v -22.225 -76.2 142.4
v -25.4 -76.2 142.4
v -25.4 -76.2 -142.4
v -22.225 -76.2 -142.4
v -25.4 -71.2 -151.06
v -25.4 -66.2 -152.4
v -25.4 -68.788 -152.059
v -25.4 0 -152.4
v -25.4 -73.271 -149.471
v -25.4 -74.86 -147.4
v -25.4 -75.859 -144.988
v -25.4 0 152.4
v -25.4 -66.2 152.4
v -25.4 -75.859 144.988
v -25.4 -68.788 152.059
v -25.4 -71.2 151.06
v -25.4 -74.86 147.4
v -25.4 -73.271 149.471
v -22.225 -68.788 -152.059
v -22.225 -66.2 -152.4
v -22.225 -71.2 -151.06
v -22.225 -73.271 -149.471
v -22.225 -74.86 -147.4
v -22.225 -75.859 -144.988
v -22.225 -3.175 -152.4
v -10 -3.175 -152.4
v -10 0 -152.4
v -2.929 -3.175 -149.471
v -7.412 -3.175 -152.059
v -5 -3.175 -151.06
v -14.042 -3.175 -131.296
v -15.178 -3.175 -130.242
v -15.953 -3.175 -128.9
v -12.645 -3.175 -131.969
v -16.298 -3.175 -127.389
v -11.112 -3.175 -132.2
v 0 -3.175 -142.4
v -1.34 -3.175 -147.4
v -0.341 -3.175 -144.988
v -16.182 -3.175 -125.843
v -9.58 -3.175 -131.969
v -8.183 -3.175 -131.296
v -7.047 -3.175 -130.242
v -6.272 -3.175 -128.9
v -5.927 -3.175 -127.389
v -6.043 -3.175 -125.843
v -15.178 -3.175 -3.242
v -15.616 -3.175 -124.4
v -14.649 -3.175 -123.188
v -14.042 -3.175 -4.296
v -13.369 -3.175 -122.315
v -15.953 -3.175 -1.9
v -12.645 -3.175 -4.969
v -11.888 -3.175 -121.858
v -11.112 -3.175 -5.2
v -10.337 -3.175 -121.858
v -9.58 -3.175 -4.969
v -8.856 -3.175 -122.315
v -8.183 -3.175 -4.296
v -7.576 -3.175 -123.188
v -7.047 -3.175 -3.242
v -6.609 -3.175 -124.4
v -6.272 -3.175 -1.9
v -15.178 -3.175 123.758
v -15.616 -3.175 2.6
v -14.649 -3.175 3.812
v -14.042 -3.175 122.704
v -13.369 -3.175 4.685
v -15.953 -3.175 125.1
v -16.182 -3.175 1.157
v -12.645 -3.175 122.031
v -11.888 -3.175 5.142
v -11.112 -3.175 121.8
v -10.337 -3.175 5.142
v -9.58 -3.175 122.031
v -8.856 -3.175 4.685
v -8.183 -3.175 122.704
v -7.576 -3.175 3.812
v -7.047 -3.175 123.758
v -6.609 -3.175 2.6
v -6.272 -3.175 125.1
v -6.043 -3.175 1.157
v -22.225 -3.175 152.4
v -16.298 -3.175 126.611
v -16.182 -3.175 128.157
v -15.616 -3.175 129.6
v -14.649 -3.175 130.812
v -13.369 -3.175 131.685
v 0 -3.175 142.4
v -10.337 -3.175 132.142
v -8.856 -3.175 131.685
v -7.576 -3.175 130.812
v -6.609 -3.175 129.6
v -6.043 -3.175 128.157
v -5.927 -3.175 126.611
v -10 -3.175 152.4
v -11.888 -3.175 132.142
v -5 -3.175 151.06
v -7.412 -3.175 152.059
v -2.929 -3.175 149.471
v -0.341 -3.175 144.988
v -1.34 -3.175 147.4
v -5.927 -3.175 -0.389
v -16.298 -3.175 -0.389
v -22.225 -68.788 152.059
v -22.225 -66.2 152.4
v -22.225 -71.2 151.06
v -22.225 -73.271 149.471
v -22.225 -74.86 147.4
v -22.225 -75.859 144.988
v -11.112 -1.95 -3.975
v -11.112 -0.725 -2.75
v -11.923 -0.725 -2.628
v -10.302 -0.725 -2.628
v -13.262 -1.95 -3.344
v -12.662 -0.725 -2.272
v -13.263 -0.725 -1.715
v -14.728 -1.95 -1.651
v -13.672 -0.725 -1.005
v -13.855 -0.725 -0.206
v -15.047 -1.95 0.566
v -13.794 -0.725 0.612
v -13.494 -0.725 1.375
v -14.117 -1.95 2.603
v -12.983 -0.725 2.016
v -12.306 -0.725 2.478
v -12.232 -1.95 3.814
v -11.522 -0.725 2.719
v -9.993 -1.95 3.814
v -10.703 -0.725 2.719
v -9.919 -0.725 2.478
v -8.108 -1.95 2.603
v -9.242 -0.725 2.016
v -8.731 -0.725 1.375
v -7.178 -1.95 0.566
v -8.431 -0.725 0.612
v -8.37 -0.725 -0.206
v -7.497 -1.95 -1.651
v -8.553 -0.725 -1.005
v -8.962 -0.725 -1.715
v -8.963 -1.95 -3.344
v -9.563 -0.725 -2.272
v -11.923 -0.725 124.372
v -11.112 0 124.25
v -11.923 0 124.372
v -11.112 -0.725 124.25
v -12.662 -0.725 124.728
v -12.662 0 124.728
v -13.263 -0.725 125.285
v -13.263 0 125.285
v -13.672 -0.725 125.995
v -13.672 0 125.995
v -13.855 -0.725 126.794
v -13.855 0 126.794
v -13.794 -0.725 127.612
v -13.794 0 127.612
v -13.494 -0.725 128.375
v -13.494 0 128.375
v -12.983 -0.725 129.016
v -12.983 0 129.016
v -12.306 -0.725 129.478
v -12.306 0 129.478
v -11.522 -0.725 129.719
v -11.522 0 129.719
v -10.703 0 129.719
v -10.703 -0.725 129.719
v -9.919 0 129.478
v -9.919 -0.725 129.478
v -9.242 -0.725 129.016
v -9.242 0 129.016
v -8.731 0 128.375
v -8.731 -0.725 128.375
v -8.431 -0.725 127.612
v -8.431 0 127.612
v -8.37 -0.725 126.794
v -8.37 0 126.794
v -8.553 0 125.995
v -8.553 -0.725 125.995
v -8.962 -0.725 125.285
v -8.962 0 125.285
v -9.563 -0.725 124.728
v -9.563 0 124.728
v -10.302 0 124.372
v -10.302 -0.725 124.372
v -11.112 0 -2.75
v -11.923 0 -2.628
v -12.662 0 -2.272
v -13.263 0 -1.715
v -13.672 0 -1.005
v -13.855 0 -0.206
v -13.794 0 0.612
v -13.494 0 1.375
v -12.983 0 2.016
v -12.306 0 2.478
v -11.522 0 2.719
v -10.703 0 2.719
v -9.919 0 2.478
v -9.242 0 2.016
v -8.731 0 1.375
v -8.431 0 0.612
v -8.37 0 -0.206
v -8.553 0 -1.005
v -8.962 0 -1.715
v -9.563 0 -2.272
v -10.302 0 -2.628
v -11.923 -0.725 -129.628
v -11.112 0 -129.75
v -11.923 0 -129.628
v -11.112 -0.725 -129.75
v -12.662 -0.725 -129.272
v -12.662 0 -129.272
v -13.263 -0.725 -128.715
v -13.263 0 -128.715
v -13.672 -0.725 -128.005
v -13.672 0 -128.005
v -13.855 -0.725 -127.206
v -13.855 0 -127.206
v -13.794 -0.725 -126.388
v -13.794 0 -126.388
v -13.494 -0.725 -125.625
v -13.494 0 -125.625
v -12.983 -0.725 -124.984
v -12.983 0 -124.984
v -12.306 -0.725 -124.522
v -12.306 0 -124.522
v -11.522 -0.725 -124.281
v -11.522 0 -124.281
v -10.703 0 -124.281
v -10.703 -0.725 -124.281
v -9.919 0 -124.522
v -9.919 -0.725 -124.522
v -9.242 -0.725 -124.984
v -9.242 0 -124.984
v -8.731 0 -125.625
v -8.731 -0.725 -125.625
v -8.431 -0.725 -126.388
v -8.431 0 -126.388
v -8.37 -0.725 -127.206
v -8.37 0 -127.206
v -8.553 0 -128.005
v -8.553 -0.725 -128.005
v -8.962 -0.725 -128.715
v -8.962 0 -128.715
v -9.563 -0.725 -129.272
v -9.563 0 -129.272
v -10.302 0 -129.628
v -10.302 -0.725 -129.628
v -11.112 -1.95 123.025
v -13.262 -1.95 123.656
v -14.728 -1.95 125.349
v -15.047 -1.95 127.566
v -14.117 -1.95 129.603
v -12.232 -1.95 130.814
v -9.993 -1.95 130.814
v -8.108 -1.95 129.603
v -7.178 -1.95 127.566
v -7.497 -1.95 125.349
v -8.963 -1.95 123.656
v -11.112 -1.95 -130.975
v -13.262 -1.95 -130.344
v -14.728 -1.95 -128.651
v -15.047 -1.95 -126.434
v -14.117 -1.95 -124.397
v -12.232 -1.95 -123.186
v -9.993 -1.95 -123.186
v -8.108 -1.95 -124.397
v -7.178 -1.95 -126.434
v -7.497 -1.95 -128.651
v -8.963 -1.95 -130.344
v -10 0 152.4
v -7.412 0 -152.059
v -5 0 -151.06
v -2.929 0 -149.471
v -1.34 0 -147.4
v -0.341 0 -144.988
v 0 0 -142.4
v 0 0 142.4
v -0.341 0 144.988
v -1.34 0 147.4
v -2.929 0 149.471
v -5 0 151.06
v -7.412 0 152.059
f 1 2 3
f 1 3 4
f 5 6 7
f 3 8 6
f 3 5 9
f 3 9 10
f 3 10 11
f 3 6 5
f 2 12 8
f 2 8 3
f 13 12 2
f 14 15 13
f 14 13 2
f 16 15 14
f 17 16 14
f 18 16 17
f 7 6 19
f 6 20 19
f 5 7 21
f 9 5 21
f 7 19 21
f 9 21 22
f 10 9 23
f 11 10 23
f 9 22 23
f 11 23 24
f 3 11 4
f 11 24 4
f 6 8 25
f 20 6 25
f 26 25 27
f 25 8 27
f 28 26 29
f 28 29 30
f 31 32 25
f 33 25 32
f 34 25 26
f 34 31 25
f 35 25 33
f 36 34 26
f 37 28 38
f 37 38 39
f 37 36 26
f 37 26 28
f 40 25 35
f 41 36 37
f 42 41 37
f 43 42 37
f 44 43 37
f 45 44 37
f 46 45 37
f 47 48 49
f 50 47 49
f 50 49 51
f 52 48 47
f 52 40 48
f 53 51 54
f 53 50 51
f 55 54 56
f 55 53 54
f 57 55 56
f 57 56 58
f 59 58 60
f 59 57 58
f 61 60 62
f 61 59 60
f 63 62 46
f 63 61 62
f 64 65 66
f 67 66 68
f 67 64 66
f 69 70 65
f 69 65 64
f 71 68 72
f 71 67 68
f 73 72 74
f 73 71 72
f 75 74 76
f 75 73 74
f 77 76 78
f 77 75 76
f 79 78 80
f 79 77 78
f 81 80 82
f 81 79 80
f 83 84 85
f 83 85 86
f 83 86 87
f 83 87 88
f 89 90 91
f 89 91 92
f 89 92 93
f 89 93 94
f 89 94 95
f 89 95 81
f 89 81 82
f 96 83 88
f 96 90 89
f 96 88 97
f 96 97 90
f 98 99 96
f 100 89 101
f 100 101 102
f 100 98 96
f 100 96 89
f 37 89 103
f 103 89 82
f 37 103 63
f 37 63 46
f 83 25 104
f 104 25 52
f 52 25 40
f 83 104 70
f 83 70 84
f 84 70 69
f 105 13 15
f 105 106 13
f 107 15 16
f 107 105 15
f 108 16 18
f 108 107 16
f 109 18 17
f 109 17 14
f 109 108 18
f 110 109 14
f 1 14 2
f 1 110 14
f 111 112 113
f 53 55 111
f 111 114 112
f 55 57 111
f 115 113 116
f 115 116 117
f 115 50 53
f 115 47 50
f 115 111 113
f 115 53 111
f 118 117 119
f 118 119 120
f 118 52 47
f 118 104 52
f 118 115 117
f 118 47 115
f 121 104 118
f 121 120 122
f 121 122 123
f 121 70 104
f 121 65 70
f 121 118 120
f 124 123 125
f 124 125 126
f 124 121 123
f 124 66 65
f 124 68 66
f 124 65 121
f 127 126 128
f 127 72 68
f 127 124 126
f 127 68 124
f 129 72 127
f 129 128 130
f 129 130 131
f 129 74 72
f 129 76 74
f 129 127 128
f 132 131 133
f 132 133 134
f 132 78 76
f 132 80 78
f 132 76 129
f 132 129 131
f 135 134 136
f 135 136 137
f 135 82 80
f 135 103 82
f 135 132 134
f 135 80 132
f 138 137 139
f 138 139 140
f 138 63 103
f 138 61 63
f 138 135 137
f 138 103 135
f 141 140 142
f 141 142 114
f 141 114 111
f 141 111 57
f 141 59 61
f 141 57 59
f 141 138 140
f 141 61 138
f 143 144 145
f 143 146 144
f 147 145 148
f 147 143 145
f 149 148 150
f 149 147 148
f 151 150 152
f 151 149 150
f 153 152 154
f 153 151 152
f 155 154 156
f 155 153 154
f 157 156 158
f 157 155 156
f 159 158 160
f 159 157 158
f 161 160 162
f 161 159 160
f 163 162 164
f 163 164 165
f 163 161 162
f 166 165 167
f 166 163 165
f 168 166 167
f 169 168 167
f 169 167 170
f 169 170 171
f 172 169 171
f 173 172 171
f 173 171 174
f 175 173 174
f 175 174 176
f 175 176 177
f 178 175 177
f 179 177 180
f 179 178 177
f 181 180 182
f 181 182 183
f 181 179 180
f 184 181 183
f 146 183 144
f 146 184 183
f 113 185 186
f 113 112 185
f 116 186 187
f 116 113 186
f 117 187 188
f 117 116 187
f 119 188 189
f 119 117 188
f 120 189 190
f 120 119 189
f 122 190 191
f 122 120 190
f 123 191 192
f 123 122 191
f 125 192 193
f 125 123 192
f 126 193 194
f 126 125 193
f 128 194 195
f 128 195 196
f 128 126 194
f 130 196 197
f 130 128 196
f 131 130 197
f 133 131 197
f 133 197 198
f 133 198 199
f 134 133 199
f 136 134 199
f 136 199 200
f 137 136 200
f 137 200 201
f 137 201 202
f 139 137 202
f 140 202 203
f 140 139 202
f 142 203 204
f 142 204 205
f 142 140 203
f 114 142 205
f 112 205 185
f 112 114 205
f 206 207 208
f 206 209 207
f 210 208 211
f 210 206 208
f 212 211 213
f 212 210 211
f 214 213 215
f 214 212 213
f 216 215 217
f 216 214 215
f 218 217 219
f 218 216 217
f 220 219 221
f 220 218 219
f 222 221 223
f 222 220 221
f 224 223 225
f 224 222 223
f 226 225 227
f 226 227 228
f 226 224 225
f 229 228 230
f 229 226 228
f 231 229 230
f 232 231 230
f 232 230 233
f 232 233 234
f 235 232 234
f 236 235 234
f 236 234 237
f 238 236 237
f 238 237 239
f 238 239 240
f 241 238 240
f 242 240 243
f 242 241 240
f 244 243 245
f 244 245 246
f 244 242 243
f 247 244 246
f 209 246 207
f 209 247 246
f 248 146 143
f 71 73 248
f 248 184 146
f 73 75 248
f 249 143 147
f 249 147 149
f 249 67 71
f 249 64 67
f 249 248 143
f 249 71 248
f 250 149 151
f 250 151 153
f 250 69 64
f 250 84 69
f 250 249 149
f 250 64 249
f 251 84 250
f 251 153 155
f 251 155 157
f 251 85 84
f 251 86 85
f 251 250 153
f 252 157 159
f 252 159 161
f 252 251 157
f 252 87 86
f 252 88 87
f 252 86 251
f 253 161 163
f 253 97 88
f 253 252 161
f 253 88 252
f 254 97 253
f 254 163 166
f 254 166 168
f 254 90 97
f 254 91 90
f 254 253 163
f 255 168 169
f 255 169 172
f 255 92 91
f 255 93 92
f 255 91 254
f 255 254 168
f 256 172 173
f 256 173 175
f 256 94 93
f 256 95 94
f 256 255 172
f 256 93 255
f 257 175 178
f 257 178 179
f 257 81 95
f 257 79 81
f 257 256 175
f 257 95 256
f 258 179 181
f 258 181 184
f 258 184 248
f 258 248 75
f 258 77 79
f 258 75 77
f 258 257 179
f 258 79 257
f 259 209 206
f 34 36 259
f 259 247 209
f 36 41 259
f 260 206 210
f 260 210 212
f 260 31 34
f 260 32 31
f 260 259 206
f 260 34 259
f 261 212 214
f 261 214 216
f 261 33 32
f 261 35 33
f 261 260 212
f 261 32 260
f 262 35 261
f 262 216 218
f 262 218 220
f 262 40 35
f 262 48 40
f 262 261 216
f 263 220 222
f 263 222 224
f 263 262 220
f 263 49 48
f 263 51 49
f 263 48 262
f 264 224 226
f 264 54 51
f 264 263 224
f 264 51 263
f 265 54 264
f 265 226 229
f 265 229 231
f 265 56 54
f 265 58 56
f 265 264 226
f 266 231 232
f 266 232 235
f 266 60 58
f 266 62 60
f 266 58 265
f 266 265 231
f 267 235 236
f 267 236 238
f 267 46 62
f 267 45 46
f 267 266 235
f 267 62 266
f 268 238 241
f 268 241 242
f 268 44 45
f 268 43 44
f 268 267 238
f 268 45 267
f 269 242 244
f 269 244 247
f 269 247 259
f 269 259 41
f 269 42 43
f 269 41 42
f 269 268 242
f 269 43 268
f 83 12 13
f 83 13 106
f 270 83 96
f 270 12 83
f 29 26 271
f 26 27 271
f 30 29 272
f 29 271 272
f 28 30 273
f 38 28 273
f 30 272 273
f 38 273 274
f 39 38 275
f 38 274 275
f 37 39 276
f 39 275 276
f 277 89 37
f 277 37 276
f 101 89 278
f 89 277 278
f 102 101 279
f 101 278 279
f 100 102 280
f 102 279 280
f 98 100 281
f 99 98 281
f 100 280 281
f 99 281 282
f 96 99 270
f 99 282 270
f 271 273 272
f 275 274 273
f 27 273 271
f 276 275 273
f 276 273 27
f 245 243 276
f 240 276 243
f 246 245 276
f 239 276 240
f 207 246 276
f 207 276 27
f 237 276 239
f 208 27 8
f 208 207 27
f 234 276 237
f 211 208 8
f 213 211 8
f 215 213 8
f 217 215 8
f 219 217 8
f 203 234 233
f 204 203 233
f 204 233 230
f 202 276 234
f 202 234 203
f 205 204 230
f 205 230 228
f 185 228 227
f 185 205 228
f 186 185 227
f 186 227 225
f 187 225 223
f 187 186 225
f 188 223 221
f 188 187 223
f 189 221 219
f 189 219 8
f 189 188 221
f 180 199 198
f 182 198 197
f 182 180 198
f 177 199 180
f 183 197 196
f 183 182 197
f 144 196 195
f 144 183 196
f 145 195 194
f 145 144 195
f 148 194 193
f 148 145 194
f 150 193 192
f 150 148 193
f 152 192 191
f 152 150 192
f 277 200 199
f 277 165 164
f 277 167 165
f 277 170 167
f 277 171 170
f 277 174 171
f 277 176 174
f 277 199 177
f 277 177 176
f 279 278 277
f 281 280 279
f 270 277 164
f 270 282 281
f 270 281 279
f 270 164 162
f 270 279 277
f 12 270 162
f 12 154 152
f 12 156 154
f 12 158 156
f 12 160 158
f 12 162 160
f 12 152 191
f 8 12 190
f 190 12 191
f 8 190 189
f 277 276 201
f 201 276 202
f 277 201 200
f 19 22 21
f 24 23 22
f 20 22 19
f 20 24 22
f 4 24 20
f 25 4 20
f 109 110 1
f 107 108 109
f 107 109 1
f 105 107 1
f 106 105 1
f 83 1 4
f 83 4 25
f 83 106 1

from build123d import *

# Parameters (mm, degrees)
EXTRUDE_THIN1_DEPTH                            = 152.4
CSK_FOR_M5_FLAT_HEAD_MACHINE_SCREW1_AT_2_COUNT = 2
CSK_FOR_M5_FLAT_HEAD_MACHINE_SCREW1_AT_2_PITCH = 127
CSK_FOR_M5_FLAT_HEAD_MACHINE_SCREW1_AT_3_COUNT = 2
CSK_FOR_M5_FLAT_HEAD_MACHINE_SCREW1_AT_3_PITCH = 254
FILLET1_R                                      = 10


with BuildPart() as part:
    # Sketch1 → Extrude-Thin1 (new, symmetric)
    with BuildSketch(Plane.XY):
        Polygon((0, 0), (-25.4, 0), (-25.4, -76.2), (-22.225, -76.2), (-22.225, -3.175), (0, -3.175), align=None)
    extrude(amount=EXTRUDE_THIN1_DEPTH, both=True)

    # Sketch3 → CSK for M5 Flat Head Machine Screw1 (revolve, cut)
    with BuildSketch(Plane(origin=(-11.1125, -3.175, 127), x_dir=(0, 0, -1), z_dir=(1, 0, 0))):
        Polygon((0, 0), (0, 3.175), (2.75, 3.175), (2.75, 2.45), (5.2, 0), align=None)
    csk_for_m5_flat_head_machine_screw1 = revolve(axis=Axis((-11.1125, -9.525, 127), (0, 1, 0)), mode=Mode.SUBTRACT)

    # CSK for M5 Flat Head Machine Screw1 at 2: CSK for M5 Flat Head Machine Screw1 ×2
    with Locations(*[(0, 0, -i * CSK_FOR_M5_FLAT_HEAD_MACHINE_SCREW1_AT_2_PITCH) for i in range(1, CSK_FOR_M5_FLAT_HEAD_MACHINE_SCREW1_AT_2_COUNT)]):
        add(csk_for_m5_flat_head_machine_screw1, mode=Mode.SUBTRACT)

    # CSK for M5 Flat Head Machine Screw1 at 3: CSK for M5 Flat Head Machine Screw1 ×2
    with Locations(*[(0, 0, -i * CSK_FOR_M5_FLAT_HEAD_MACHINE_SCREW1_AT_3_PITCH) for i in range(1, CSK_FOR_M5_FLAT_HEAD_MACHINE_SCREW1_AT_3_COUNT)]):
        add(csk_for_m5_flat_head_machine_screw1, mode=Mode.SUBTRACT)

    # Fillet1
    fillet1_edges = [part.edges().sort_by_distance(p)[0] for p in [
        (0, -1.5875, 152.4),
        (0, -1.5875, -152.4),
        (-23.8125, -76.2, -152.4),
        (-23.8125, -76.2, 152.4),
    ]]
    fillet(fillet1_edges, radius=FILLET1_R)


solid = part.part
